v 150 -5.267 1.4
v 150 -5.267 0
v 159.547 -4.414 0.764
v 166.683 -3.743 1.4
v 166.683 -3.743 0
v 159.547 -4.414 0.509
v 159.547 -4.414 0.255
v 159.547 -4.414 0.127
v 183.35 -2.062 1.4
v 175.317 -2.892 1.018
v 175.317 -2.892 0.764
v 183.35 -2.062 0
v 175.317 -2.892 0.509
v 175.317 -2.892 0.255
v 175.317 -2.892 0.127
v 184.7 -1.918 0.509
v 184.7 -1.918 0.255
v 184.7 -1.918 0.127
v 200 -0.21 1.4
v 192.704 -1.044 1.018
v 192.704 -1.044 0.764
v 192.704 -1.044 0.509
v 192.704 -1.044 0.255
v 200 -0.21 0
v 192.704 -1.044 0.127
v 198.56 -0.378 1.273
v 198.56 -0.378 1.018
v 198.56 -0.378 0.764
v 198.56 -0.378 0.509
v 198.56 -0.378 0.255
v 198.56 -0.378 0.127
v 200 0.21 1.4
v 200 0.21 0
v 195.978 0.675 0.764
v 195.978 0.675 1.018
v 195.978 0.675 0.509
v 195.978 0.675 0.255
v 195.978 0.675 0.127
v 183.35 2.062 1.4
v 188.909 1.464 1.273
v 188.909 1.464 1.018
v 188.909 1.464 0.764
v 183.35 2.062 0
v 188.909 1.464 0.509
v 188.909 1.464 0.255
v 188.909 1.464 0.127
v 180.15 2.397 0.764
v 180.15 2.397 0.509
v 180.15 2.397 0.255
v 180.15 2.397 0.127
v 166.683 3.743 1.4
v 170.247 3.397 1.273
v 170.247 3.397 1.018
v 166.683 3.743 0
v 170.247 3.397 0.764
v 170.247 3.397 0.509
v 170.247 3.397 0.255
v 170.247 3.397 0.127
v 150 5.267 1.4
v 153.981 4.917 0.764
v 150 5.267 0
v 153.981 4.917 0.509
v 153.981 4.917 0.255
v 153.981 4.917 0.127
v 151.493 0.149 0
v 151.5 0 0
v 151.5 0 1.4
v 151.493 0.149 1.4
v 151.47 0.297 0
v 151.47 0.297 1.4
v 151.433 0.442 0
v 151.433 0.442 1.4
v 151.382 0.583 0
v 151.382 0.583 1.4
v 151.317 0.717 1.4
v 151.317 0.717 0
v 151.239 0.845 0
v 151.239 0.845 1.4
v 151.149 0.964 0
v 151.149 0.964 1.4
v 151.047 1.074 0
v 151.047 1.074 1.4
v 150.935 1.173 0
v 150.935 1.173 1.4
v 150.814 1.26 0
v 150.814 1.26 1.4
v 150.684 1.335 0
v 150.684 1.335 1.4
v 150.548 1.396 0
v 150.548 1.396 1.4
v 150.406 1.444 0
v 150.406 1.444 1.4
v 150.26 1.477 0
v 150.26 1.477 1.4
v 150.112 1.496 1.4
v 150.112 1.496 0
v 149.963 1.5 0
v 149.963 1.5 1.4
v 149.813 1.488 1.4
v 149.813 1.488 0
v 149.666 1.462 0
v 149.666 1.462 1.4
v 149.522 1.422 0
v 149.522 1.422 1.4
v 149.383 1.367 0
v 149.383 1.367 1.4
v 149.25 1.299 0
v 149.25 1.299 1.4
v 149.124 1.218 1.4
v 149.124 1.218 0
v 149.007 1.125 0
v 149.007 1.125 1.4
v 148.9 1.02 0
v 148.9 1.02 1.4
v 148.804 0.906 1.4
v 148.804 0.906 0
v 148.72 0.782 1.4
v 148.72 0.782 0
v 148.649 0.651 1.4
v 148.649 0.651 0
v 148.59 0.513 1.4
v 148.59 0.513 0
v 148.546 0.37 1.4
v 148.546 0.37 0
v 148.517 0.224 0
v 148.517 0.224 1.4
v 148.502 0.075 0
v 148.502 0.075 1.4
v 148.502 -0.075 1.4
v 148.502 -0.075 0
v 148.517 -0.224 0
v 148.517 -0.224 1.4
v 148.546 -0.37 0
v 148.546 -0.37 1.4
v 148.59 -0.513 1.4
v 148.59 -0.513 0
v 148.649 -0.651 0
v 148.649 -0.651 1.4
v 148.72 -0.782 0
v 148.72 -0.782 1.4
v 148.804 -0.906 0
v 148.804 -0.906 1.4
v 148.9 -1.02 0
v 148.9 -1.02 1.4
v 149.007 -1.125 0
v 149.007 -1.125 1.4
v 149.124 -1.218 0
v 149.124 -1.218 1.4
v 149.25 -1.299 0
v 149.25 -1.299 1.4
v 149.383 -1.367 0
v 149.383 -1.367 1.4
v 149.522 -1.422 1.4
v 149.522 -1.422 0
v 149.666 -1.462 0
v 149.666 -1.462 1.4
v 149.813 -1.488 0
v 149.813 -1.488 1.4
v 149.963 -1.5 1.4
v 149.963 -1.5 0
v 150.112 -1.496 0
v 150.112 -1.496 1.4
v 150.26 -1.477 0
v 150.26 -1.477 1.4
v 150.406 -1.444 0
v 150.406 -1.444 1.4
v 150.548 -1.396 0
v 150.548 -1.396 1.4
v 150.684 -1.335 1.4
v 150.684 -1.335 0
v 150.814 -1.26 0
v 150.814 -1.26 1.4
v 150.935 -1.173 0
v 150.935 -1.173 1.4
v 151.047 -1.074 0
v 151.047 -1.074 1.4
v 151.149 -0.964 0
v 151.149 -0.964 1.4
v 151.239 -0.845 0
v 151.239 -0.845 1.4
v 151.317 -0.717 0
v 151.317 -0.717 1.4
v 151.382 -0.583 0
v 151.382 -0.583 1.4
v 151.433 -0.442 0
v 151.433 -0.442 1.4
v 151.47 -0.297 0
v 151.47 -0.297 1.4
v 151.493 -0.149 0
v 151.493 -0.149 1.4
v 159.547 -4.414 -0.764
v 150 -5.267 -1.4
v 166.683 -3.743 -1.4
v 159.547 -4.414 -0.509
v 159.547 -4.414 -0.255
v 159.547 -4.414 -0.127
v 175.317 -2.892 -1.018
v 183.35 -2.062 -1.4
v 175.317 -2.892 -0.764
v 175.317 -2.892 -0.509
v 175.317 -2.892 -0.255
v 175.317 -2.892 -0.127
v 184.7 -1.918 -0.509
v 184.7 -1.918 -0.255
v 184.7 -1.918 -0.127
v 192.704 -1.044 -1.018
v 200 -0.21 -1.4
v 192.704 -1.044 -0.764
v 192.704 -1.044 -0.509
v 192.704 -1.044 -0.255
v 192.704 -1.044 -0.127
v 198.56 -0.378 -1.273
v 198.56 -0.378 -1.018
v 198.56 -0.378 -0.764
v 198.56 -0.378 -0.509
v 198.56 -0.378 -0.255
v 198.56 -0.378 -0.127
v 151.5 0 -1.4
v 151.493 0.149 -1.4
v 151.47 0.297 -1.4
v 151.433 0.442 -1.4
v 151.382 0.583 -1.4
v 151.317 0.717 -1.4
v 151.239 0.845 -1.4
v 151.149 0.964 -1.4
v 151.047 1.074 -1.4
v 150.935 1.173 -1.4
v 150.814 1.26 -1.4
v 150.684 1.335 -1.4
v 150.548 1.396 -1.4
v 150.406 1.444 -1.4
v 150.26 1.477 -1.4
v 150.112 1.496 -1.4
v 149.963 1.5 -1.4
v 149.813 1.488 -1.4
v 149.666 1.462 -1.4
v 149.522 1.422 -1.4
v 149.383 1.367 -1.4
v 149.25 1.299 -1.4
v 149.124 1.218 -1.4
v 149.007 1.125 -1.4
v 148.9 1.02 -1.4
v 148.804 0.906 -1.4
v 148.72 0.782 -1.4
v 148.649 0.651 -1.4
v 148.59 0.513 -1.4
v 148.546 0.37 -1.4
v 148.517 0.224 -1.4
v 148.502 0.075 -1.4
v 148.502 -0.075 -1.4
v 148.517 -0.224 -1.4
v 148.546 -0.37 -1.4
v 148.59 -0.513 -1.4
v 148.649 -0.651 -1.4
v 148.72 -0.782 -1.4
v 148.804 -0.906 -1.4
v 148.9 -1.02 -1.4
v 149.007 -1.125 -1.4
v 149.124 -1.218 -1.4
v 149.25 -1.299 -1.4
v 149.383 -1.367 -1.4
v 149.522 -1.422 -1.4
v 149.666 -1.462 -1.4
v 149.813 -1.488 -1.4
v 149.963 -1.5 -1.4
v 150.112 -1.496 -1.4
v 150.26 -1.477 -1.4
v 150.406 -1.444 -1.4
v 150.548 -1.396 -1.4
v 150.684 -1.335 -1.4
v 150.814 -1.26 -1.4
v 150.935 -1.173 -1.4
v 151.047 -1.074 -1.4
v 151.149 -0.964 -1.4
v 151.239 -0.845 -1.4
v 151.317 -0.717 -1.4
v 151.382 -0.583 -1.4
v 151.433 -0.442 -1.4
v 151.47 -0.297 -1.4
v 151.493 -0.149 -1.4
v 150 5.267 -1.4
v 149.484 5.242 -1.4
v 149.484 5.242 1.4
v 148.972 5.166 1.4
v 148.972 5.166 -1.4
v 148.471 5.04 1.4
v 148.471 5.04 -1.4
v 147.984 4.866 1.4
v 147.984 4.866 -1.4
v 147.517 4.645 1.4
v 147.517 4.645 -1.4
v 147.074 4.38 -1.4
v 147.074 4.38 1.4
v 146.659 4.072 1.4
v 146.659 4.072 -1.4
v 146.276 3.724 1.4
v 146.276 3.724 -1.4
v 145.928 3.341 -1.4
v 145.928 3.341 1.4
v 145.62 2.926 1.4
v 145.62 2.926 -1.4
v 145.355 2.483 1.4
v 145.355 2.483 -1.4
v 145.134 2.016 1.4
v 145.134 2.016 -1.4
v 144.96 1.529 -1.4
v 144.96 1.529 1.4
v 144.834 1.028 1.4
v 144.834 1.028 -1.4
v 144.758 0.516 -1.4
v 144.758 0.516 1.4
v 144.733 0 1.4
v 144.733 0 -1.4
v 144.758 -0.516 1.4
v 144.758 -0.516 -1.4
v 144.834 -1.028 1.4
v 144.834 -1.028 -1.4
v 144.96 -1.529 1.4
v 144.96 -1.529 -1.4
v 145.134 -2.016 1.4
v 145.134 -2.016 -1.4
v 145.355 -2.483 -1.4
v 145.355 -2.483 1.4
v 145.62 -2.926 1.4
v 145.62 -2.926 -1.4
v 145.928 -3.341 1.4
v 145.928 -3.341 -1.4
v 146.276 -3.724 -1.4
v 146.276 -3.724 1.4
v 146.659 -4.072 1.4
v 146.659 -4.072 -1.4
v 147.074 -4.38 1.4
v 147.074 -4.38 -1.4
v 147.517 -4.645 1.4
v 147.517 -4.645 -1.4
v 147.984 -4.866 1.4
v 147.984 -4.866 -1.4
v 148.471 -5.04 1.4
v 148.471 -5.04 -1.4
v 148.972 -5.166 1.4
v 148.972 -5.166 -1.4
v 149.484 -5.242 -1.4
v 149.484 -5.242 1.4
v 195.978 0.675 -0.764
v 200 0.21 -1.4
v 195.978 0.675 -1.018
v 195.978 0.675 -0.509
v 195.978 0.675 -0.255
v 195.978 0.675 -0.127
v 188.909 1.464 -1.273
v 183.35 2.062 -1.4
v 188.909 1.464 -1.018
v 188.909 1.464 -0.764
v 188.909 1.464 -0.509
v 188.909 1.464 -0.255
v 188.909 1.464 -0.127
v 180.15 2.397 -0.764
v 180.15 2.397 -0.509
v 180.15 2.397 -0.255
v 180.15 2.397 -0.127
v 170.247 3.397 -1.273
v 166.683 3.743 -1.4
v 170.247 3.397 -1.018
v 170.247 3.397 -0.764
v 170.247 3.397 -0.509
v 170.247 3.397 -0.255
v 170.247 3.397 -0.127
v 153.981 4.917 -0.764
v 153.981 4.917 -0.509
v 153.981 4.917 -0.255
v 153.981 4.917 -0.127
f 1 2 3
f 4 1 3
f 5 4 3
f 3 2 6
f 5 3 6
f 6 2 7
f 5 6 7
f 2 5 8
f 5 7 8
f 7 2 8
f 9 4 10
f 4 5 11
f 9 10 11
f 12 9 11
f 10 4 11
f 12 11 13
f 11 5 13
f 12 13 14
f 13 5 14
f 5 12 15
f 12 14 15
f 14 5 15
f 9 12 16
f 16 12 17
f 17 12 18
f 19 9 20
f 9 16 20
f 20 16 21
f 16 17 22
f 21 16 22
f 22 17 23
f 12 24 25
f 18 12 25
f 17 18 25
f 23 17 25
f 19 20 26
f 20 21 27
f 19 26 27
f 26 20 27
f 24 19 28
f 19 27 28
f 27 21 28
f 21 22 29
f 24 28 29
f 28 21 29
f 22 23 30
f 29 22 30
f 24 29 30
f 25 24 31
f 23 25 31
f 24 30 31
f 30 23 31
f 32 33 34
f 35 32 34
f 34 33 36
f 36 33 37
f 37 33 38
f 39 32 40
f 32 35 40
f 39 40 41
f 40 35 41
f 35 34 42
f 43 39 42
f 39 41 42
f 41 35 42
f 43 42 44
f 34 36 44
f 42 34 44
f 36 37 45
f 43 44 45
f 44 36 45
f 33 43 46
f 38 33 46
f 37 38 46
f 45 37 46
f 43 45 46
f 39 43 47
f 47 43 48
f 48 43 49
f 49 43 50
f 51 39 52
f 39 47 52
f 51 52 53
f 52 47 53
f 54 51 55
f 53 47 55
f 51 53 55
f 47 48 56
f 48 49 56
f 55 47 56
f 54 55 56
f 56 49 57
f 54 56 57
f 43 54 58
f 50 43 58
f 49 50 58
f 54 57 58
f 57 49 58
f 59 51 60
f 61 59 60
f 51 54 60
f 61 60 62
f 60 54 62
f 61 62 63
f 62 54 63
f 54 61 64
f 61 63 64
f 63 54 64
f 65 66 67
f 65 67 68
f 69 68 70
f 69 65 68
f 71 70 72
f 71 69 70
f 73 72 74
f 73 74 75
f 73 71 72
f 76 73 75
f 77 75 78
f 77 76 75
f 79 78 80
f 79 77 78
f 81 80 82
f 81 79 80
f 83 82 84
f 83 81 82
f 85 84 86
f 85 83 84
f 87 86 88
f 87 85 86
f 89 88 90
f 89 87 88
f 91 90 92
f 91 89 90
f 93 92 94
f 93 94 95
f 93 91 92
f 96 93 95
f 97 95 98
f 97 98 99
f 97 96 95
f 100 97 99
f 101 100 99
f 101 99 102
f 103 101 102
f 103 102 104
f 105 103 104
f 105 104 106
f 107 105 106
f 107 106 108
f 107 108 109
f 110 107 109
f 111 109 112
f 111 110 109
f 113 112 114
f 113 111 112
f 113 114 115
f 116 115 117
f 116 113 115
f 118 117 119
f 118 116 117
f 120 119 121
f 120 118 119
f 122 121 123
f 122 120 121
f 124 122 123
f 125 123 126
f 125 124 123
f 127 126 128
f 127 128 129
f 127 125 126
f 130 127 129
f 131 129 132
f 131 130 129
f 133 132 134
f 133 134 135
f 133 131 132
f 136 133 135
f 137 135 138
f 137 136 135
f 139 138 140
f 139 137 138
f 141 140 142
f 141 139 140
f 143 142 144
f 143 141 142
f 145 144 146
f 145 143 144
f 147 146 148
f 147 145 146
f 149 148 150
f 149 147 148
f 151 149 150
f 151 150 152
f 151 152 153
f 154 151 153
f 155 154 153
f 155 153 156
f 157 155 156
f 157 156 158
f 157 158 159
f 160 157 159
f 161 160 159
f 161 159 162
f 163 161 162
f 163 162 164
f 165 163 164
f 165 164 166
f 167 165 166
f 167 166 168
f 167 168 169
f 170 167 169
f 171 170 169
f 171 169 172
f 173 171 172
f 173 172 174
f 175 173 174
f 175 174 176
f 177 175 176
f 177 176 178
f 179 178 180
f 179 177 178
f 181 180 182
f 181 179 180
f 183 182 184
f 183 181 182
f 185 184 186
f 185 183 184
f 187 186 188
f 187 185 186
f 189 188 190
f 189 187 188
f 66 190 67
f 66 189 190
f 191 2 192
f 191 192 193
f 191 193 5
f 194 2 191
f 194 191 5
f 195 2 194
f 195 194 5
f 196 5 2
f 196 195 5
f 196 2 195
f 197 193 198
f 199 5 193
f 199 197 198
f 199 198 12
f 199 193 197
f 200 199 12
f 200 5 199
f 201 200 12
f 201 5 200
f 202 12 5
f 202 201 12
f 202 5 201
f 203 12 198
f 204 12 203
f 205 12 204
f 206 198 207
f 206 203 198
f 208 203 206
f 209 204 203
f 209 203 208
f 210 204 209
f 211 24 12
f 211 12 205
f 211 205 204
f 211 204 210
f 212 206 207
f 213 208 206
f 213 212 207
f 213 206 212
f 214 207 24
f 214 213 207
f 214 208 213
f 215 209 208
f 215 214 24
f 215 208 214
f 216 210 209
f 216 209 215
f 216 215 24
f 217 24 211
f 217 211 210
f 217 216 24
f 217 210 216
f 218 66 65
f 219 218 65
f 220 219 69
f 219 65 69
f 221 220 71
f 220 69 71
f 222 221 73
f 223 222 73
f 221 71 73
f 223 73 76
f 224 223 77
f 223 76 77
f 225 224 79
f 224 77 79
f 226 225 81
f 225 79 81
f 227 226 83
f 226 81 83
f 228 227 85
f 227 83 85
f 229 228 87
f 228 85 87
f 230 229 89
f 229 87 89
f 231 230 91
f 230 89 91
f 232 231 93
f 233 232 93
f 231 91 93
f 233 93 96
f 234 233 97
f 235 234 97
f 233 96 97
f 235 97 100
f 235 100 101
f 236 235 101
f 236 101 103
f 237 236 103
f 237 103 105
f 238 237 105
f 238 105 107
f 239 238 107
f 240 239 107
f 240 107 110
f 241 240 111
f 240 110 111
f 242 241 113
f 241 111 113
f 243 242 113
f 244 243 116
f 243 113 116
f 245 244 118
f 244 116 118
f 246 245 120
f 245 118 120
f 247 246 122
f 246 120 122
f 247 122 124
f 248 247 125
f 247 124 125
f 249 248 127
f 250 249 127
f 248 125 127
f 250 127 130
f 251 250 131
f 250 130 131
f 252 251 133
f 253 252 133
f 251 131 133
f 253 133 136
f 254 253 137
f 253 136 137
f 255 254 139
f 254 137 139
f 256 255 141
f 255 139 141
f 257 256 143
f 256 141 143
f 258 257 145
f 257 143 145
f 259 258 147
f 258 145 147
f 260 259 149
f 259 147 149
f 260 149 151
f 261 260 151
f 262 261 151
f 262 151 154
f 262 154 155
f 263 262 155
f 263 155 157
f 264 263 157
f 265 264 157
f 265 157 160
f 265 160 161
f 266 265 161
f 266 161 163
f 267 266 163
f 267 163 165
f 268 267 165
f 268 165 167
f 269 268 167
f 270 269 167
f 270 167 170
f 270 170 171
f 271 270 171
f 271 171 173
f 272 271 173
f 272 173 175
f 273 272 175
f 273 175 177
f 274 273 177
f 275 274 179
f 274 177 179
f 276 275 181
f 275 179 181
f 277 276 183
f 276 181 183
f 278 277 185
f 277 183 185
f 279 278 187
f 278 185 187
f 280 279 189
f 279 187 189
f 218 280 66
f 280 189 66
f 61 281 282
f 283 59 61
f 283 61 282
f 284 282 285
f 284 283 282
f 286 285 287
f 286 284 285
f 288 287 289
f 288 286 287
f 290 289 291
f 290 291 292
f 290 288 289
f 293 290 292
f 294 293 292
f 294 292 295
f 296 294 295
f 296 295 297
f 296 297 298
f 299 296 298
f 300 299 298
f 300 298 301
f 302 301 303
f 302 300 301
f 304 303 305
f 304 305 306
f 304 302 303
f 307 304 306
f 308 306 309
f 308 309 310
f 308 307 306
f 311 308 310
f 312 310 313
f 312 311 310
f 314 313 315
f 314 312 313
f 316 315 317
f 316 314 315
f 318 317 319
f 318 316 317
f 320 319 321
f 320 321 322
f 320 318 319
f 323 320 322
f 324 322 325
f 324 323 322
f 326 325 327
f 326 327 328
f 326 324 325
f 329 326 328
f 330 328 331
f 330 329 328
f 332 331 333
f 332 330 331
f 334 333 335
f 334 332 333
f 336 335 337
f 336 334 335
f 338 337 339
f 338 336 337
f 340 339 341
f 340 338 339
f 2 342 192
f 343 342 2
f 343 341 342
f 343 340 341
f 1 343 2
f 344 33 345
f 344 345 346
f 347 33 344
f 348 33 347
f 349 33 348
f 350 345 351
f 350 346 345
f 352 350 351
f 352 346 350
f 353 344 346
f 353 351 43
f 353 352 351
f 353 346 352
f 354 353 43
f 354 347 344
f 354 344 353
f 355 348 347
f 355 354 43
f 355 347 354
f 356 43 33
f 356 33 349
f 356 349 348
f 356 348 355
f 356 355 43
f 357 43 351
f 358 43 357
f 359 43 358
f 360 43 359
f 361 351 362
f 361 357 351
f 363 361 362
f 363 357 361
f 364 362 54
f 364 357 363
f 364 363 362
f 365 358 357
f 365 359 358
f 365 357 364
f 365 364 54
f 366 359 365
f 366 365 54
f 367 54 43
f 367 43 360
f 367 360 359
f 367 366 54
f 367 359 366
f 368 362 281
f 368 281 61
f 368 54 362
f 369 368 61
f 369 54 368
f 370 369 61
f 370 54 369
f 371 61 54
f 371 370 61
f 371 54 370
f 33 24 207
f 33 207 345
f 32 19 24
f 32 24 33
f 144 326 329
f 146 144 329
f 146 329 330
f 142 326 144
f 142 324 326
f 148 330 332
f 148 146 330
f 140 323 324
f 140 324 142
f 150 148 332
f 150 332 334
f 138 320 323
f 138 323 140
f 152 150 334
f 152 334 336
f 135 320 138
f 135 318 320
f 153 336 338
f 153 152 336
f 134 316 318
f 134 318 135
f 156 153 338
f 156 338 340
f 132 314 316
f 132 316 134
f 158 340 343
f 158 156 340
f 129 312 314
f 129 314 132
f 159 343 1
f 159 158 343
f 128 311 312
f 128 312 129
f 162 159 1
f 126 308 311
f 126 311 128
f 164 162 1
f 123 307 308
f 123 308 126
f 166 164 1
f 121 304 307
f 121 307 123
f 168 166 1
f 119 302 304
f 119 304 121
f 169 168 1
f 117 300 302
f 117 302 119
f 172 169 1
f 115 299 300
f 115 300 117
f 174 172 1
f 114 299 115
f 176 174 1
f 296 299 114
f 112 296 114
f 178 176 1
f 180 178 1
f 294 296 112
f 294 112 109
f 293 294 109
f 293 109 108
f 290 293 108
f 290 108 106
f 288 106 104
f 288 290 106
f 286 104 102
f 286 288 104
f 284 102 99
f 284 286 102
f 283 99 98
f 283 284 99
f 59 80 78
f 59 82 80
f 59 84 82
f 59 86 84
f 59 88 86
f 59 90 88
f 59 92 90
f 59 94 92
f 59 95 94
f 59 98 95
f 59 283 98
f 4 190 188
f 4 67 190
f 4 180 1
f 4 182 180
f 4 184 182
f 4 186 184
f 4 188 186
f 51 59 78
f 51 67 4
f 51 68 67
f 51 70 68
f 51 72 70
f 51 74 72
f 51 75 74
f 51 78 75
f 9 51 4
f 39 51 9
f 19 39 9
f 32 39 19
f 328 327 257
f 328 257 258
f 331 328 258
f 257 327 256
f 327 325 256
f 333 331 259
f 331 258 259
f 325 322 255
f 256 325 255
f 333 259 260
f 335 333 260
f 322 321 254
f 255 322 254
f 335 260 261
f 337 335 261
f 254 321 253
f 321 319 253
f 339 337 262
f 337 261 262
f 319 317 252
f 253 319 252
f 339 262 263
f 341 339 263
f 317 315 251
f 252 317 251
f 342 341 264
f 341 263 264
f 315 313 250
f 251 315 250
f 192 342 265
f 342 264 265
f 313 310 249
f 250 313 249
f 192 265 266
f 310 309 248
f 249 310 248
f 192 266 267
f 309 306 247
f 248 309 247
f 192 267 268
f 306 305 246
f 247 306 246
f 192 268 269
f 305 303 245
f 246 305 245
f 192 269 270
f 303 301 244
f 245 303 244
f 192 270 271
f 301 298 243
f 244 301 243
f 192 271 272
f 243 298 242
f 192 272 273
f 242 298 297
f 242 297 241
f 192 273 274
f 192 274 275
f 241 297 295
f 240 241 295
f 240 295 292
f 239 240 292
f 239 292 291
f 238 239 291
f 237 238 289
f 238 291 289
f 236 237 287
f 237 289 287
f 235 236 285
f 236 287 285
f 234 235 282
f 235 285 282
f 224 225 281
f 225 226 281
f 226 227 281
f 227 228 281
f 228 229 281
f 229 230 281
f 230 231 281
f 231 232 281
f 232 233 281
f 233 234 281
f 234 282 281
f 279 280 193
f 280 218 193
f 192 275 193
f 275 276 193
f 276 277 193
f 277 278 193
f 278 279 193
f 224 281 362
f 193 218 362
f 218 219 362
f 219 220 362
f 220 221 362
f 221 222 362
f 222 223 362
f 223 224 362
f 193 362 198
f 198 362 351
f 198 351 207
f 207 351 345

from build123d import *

# Parameters (mm, degrees)
SKETCH_3_R      = 1.5
EXTRUDE_1_DEPTH = 1.4


with BuildPart() as part:
    # Эскиз3 → Бобышка-Вытянуть1 (new, symmetric)
    with BuildSketch(Plane.XY):
        with BuildLine():
            Line((200, -0.21), (200, 0.21))
            add(Edge.make_bspline(
                [(200, 0.21), (199.520051416, 0.265971644), (198.179524953, 0.422303954), (195.747560944, 0.701689979), (192.530784687, 1.065063842), (188.771568451, 1.480695182), (184.58704572, 1.932479181), (180.05616868, 2.409243063), (175.238405485, 2.90257428), (168.371896377, 3.585728287), (161.260104983, 4.261418012), (154.510064634, 4.872380257), (151.327214442, 5.152043902), (150, 5.267185398)],
                knots=[0, 0, 0, 0, 0.007144724, 0.019955661, 0.036196061, 0.055011184, 0.075878938, 0.098428866, 0.122375554, 0.147487885, 0.200459747, 0.22800517, 0.247703369, 0.247703369, 0.247703369, 0.247703369], degree=3))
            ThreePointArc((150, 5.267185398), (144.732814602, 0), (150, -5.267185398))
            add(Edge.make_bspline(
                [(150, -5.267185398), (151.327214442, -5.152043902), (154.510064634, -4.872380257), (161.260104983, -4.261418012), (168.371896377, -3.585728287), (175.238405485, -2.90257428), (180.05616868, -2.409243063), (184.58704572, -1.932479181), (188.771568451, -1.480695182), (192.530784687, -1.065063842), (195.747560944, -0.701689979), (198.179524953, -0.422303954), (199.520051416, -0.265971644), (200, -0.21)],
                knots=[0.752296631, 0.752296631, 0.752296631, 0.752296631, 0.77199483, 0.799540253, 0.852512115, 0.877624446, 0.901571134, 0.924121062, 0.944988816, 0.963803939, 0.980044339, 0.992855276, 1, 1, 1, 1], degree=3))
        make_face()
        with Locations((150, 0)):
            Circle(SKETCH_3_R, mode=Mode.SUBTRACT)
    extrude(amount=EXTRUDE_1_DEPTH, both=True)


solid = part.part
